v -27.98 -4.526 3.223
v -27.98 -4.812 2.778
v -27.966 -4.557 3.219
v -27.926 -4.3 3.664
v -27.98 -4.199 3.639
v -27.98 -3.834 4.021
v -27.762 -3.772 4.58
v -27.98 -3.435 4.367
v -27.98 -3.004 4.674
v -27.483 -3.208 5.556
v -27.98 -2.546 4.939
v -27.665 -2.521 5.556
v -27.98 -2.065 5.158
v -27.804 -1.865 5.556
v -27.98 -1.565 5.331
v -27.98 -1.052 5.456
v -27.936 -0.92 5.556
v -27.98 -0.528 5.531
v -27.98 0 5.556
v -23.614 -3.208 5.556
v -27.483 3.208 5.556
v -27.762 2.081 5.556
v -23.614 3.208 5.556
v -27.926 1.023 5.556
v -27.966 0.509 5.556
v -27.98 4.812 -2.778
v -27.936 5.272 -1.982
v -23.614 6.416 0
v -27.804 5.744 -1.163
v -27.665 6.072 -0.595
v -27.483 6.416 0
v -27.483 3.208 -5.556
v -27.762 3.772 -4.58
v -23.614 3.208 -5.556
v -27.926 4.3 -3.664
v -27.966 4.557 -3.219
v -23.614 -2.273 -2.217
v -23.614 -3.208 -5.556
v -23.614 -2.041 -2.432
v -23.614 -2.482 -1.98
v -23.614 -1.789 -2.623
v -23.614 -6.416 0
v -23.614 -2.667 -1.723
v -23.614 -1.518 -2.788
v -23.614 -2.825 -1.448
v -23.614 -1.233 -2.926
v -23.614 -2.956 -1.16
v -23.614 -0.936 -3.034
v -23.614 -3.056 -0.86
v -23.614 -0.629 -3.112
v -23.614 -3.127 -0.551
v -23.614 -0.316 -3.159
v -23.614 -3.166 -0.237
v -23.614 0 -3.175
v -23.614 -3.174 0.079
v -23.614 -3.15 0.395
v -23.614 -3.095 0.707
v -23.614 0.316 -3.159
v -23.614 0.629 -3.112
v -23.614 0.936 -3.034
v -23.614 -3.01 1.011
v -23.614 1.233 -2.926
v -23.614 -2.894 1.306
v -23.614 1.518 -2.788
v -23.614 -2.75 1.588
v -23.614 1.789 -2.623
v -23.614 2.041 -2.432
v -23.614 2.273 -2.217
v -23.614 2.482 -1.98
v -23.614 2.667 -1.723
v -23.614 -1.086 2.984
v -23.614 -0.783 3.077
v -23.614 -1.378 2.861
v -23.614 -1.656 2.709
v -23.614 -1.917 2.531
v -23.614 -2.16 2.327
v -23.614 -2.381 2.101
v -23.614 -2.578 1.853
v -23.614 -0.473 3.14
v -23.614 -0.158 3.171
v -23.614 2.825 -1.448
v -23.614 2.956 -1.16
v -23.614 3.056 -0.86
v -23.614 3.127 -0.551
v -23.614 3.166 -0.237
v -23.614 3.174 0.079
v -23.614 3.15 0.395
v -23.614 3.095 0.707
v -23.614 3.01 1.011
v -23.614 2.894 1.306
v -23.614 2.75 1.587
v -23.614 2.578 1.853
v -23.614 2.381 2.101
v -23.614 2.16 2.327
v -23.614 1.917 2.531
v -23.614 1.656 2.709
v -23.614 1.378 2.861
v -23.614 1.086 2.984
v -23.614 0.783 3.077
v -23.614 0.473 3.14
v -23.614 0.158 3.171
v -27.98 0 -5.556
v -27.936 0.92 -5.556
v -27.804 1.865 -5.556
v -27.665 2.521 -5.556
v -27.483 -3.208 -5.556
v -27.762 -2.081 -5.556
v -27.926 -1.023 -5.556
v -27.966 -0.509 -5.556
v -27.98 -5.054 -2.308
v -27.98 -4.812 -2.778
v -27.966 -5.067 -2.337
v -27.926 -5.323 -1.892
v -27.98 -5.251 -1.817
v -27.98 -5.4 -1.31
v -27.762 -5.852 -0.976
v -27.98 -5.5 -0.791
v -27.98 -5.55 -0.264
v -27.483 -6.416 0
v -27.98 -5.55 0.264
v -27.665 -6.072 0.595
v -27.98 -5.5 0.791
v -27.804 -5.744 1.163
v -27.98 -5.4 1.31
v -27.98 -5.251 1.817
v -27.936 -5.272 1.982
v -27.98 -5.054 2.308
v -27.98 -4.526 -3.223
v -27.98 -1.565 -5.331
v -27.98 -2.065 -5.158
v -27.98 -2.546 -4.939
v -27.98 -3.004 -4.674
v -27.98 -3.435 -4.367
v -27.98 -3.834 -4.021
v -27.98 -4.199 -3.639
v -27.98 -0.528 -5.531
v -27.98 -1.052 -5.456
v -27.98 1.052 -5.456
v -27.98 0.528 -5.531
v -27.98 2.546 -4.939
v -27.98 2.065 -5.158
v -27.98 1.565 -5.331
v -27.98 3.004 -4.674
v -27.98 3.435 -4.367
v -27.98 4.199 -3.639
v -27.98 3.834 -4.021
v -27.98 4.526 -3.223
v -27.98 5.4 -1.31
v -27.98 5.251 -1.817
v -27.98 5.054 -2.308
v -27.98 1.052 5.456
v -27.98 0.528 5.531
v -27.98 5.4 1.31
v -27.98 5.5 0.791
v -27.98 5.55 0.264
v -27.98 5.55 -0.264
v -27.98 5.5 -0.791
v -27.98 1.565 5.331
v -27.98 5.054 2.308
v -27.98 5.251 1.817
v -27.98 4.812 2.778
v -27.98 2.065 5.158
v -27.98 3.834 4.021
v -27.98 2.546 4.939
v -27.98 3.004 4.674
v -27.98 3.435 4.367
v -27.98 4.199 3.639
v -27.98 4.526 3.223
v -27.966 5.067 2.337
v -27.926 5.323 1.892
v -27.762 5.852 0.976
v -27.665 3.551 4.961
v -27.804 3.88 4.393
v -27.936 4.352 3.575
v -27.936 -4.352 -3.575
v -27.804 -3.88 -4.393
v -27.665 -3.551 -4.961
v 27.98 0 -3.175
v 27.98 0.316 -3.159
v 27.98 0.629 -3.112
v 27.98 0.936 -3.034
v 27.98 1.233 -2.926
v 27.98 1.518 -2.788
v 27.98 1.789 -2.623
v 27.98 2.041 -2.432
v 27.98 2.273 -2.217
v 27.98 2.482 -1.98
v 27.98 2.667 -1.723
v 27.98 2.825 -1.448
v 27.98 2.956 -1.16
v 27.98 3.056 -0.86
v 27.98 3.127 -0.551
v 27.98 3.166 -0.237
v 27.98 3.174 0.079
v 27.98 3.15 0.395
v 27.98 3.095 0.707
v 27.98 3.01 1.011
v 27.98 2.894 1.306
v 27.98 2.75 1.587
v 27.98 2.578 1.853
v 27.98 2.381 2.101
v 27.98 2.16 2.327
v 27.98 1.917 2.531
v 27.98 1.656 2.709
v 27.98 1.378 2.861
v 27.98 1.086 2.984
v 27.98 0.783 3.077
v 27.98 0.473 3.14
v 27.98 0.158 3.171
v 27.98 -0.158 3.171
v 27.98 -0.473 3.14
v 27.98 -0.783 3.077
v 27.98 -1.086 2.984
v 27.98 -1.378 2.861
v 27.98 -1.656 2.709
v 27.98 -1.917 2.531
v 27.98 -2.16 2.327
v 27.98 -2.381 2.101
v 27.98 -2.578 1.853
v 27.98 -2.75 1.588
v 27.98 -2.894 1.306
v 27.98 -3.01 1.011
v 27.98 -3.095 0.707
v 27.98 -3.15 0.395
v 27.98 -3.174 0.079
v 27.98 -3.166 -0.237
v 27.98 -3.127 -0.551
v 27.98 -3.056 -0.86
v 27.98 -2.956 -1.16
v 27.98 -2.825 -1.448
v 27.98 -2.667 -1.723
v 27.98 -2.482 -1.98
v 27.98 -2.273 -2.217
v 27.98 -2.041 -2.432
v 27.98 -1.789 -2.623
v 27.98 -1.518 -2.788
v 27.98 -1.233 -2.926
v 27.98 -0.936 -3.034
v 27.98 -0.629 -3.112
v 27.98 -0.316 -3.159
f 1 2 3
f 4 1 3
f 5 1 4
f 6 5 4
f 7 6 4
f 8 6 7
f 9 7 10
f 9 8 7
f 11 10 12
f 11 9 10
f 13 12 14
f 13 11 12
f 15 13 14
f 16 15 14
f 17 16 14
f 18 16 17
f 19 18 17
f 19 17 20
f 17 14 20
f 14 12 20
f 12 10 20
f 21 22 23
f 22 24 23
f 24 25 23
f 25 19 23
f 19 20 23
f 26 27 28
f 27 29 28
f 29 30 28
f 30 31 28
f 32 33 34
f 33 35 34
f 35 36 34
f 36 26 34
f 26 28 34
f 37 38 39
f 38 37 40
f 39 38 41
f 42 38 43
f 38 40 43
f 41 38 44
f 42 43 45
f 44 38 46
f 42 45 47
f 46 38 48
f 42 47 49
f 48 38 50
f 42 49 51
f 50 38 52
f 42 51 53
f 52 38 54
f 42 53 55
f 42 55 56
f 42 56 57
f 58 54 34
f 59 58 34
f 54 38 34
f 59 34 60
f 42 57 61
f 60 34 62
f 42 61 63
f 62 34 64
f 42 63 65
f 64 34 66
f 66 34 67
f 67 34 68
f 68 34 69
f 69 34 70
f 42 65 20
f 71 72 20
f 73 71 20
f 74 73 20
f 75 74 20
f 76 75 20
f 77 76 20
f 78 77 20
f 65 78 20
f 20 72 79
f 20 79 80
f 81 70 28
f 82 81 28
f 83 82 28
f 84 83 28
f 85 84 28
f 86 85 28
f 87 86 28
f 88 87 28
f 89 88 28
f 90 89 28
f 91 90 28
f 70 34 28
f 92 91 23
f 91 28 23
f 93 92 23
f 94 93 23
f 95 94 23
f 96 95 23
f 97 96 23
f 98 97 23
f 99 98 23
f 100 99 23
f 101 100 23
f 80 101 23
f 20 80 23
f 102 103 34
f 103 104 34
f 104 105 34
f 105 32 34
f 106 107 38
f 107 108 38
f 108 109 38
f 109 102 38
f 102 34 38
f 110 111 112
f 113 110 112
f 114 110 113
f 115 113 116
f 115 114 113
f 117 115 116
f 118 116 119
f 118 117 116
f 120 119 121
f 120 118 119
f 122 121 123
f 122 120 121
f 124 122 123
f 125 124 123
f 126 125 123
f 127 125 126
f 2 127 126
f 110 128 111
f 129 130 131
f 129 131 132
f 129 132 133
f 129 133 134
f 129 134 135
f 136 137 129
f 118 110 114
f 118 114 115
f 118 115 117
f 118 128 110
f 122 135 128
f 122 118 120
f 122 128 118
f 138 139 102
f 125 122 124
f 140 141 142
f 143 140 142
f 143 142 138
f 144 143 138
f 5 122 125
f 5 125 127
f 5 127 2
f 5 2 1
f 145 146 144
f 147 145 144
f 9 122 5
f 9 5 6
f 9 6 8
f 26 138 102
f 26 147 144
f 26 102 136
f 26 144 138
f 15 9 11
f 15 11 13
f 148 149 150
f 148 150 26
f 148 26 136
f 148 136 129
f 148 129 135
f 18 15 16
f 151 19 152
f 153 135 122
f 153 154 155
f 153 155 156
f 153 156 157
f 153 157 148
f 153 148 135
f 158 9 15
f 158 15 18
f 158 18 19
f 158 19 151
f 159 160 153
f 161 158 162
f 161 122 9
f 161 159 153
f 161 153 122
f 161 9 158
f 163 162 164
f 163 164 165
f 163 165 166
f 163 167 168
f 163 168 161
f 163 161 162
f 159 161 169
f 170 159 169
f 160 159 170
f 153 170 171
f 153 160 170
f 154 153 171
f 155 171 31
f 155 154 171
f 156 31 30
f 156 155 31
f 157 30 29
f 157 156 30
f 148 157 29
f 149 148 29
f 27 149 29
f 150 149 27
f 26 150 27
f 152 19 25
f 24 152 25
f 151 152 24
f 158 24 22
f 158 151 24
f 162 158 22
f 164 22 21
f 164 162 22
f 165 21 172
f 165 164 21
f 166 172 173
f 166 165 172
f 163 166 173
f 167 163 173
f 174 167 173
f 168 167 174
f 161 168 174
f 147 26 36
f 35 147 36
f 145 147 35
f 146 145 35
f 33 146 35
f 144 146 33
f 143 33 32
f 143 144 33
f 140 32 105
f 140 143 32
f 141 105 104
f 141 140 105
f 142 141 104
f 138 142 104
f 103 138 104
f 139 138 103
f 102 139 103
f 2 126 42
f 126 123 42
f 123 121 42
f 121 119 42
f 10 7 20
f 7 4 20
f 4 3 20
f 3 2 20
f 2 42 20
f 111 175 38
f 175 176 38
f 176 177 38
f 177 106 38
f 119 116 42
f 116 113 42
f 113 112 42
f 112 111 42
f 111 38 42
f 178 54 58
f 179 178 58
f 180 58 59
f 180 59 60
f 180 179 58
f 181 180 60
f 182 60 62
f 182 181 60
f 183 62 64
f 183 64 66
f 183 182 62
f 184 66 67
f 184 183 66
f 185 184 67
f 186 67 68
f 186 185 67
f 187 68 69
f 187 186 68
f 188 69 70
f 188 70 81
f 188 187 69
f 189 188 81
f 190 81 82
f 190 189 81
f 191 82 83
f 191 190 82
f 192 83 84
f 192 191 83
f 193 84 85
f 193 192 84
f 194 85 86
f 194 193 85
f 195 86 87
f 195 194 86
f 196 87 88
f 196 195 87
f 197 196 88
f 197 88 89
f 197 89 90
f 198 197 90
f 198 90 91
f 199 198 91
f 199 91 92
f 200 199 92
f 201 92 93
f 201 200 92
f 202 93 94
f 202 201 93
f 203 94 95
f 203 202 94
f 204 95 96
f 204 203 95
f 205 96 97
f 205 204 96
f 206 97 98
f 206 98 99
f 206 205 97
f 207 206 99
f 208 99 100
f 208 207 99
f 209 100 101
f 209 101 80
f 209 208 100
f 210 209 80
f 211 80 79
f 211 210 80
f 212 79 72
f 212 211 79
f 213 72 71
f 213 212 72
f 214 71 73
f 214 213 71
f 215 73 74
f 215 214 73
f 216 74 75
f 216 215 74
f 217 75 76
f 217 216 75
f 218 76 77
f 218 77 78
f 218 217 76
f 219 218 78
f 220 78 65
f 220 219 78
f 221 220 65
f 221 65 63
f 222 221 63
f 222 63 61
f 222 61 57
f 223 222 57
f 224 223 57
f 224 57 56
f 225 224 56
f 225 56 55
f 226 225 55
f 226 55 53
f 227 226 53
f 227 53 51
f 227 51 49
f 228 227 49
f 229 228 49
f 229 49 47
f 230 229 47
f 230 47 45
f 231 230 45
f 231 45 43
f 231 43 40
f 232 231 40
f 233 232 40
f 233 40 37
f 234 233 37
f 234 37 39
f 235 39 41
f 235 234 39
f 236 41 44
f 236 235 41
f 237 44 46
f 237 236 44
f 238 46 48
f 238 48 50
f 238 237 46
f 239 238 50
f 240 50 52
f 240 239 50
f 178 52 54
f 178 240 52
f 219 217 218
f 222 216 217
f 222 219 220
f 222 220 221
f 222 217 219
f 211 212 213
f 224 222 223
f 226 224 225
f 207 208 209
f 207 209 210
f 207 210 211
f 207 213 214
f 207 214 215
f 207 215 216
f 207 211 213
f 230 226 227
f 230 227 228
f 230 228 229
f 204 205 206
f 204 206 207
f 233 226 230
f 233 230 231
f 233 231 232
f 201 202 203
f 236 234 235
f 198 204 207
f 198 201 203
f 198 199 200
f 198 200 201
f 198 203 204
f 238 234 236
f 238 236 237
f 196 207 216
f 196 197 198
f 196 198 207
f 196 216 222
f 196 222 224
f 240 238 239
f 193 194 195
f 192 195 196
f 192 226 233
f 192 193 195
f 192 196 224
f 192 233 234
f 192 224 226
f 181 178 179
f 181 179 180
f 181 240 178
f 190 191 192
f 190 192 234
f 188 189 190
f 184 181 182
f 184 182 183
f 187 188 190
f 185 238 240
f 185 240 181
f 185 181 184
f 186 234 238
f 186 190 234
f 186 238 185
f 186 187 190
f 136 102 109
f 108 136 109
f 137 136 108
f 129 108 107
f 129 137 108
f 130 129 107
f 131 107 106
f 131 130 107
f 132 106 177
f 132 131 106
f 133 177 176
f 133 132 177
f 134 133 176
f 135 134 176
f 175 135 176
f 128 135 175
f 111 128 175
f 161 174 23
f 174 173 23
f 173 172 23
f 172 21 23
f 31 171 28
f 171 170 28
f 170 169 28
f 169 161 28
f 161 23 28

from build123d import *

# Parameters (mm, degrees)
SKETCH5_R           = 3.175
BOSS_EXTRUDE3_DEPTH = 51.59375
BOSS_EXTRUDE4_DEPTH = 4.365625
SKETCH8_OUTSIDE_W   = 224.338
SKETCH8_OUTSIDE_H   = 226.058
SKETCH8_OUTSIDE_R   = 5.55625
CUT_EXTRUDE3_DEPTH  = 57.599347315
CUT_EXTRUDE3_DRAFT  = -60


with BuildPart() as part:
    # Sketch5 → Boss-Extrude3 (new body)
    with BuildSketch(Plane(origin=(27.9796875, 0, 0), x_dir=(0, 0, -1), z_dir=(1, 0, 0))):
        Circle(SKETCH5_R)
    extrude(amount=-BOSS_EXTRUDE3_DEPTH)

    # Sketch6 → Boss-Extrude4 (add)
    with BuildSketch(Plane.ZY.offset(23.6140625)):
        Polygon((5.55625, 3.207902433), (0, 6.415804866), (-5.55625, 3.207902433), (-5.55625, -3.207902433), (0, -6.415804866), (5.55625, -3.207902433), align=None)
    extrude(amount=BOSS_EXTRUDE4_DEPTH)


with BuildPart() as cut_extrude3_tool:
    # Sketch8 outside → Cut-Extrude3 (with draft: the straight prism first)
    with BuildSketch(Plane.ZY.offset(27.9796875)):
        Rectangle(SKETCH8_OUTSIDE_W, SKETCH8_OUTSIDE_H)
        Circle(SKETCH8_OUTSIDE_R, mode=Mode.SUBTRACT)
    extrude(amount=-CUT_EXTRUDE3_DEPTH)
    # Cut-Extrude3: the draft: its side faces are tilted about the plane it starts from
    cut_extrude3_sides = [cut_extrude3_tool.faces().sort_by_distance(p)[0] for p in [
        (0.819986158, -113.029, 0),
        (0.819986158, 0, 112.169),
        (0.819986158, 113.029, 0),
        (0.819986158, 0, -112.169),
        (0.819986158, 0, -5.55625),
    ]]
    draft(cut_extrude3_sides, Plane.ZY.offset(27.9796875), CUT_EXTRUDE3_DRAFT)


with BuildPart() as part_1:
    add(part.part)

    # Cut-Extrude3: cut by cut_extrude3_tool
    add(cut_extrude3_tool.part, mode=Mode.SUBTRACT)


solid = part_1.part
